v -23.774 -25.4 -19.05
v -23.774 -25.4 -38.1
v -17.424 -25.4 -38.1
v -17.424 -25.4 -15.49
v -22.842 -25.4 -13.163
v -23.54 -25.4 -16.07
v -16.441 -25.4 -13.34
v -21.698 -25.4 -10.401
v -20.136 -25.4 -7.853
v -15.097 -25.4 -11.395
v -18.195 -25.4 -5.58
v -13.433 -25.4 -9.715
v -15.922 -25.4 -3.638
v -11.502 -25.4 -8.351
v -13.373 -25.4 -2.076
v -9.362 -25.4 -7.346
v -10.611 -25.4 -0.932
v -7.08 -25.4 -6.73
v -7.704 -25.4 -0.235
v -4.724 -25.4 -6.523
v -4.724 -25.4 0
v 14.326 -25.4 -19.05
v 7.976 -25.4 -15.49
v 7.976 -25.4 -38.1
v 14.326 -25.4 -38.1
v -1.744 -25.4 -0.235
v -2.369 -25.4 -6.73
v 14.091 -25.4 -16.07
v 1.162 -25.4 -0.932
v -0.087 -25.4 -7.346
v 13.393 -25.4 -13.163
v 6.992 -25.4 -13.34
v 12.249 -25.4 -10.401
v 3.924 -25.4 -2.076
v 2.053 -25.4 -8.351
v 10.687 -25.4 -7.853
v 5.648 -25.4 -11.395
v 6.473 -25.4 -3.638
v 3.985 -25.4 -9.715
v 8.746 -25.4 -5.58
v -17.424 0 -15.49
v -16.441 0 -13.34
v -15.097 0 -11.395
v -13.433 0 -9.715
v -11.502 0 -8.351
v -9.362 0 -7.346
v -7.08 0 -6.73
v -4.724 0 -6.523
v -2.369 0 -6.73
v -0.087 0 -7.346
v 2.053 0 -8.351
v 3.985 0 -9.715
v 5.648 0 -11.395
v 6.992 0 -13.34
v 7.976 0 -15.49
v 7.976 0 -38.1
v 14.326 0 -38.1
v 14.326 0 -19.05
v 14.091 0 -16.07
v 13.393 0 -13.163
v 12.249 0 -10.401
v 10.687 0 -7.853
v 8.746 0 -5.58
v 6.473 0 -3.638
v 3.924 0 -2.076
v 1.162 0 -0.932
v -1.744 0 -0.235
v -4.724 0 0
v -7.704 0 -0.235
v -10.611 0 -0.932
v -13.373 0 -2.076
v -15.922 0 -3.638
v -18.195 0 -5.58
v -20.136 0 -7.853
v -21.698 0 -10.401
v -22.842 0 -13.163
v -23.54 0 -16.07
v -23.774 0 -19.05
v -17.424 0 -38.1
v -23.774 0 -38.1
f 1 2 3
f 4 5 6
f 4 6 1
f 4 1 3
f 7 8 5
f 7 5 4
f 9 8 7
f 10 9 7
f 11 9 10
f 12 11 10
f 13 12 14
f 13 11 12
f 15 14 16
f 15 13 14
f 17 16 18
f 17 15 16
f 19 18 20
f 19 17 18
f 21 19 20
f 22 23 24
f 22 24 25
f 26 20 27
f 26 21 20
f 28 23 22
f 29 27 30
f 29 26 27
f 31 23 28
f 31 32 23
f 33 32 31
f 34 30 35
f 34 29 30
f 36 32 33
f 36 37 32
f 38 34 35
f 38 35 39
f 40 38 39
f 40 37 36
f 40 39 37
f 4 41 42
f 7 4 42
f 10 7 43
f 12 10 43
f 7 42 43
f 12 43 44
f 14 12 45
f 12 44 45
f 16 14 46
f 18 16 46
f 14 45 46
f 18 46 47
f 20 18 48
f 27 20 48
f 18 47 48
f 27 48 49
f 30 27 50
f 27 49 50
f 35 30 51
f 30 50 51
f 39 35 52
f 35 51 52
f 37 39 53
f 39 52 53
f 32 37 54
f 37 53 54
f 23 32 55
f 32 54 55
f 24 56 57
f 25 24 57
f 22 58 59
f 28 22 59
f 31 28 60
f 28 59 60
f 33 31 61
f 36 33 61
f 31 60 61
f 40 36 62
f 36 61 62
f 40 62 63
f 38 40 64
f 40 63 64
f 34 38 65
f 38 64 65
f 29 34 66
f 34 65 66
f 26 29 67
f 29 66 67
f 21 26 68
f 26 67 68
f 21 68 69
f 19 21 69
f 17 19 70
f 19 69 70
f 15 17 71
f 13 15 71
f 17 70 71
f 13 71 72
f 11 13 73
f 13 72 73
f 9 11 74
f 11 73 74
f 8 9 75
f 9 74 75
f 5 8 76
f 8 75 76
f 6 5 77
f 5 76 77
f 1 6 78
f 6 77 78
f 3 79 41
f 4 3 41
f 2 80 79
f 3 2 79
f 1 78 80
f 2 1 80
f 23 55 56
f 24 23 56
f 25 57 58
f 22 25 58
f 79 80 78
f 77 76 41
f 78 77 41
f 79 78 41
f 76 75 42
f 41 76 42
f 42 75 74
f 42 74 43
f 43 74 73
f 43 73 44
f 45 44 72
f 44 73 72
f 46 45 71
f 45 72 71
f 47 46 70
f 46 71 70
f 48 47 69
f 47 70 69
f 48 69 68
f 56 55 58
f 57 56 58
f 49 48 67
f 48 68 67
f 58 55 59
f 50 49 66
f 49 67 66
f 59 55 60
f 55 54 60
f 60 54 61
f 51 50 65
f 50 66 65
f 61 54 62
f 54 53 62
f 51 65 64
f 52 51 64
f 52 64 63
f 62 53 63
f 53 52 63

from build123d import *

# Parameters (mm, degrees)
F1_DEPTH = 25.4
F2_DEPTH = 25.4
F3_DEPTH = 25.4


with BuildPart() as f1:
    # F0 (on Front) → F1 (new body)
    with BuildSketch(Plane.XZ):
        with BuildLine():
            ThreePointArc((-4.7244, 0), (-18.194785, -5.579616), (-23.7744, -19.05))
            Line((-23.7744, -19.05), (-23.7744, -38.1))
            Line((-23.7744, -38.1), (-17.4244, -38.1))
            Line((-17.4244, -38.1), (-17.4244, -24.509516))
            ThreePointArc((-17.4244, -24.509516), (-18.201369, -19.999674), (-17.4244, -15.489832))
            Line((-17.4244, -15.489832), (-17.4244, -6.35))
            Line((-17.4244, -6.35), (7.9756, -6.35))
            Line((7.9756, -6.35), (7.9756, -15.489832))
            ThreePointArc((7.9756, -15.489832), (8.752568, -19.999674), (7.9756, -24.509516))
            Line((7.9756, -24.509516), (7.9756, -38.1))
            Line((7.9756, -38.1), (14.3256, -38.1))
            Line((14.3256, -38.1), (14.3256, -19.05))
            ThreePointArc((14.3256, -19.05), (8.745984, -5.579616), (-4.7244, 0))
        make_face()
    extrude(amount=F1_DEPTH)

    # F0 (on Front) → F2 (join)
    with BuildSketch(Plane.XZ):
        with BuildLine():
            ThreePointArc((-4.7244, 0), (-18.194785, -5.579616), (-23.7744, -19.05))
            Line((-23.7744, -19.05), (-23.7744, -38.1))
            Line((-23.7744, -38.1), (-17.4244, -38.1))
            Line((-17.4244, -38.1), (-17.4244, -24.509516))
            ThreePointArc((-17.4244, -24.509516), (-18.201369, -19.999674), (-17.4244, -15.489832))
            Line((-17.4244, -15.489832), (-17.4244, -6.35))
            Line((-17.4244, -6.35), (7.9756, -6.35))
            Line((7.9756, -6.35), (7.9756, -15.489832))
            ThreePointArc((7.9756, -15.489832), (8.752568, -19.999674), (7.9756, -24.509516))
            Line((7.9756, -24.509516), (7.9756, -38.1))
            Line((7.9756, -38.1), (14.3256, -38.1))
            Line((14.3256, -38.1), (14.3256, -19.05))
            ThreePointArc((14.3256, -19.05), (8.745984, -5.579616), (-4.7244, 0))
        make_face()
        with BuildLine():
            ThreePointArc((-17.4244, -15.489832), (-18.201369, -19.999674), (-17.4244, -24.509516))
            Line((-17.4244, -24.509516), (-17.4244, -15.489832))
        make_face()
        with BuildLine():
            Line((-17.4244, -6.35), (-17.4244, -15.489832))
            ThreePointArc((-17.4244, -15.489832), (-4.7244, -6.522705), (7.9756, -15.489832))
            Line((7.9756, -15.489832), (7.9756, -6.35))
            Line((7.9756, -6.35), (-17.4244, -6.35))
        make_face()
        with BuildLine():
            ThreePointArc((7.9756, -24.509516), (8.752568, -19.999674), (7.9756, -15.489832))
            Line((7.9756, -15.489832), (7.9756, -24.509516))
        make_face()
    extrude(amount=F2_DEPTH)

    # F0 (on Front) → F3 (join)
    with BuildSketch(Plane.XZ):
        with BuildLine():
            ThreePointArc((-4.7244, 0), (-18.194785, -5.579616), (-23.7744, -19.05))
            Line((-23.7744, -19.05), (-23.7744, -38.1))
            Line((-23.7744, -38.1), (-17.4244, -38.1))
            Line((-17.4244, -38.1), (-17.4244, -24.509516))
            ThreePointArc((-17.4244, -24.509516), (-18.201369, -19.999674), (-17.4244, -15.489832))
            Line((-17.4244, -15.489832), (-17.4244, -6.35))
            Line((-17.4244, -6.35), (7.9756, -6.35))
            Line((7.9756, -6.35), (7.9756, -15.489832))
            ThreePointArc((7.9756, -15.489832), (8.752568, -19.999674), (7.9756, -24.509516))
            Line((7.9756, -24.509516), (7.9756, -38.1))
            Line((7.9756, -38.1), (14.3256, -38.1))
            Line((14.3256, -38.1), (14.3256, -19.05))
            ThreePointArc((14.3256, -19.05), (8.745984, -5.579616), (-4.7244, 0))
        make_face()
        with BuildLine():
            ThreePointArc((-17.4244, -15.489832), (-18.201369, -19.999674), (-17.4244, -24.509516))
            Line((-17.4244, -24.509516), (-17.4244, -15.489832))
        make_face()
        with BuildLine():
            Line((-17.4244, -6.35), (-17.4244, -15.489832))
            ThreePointArc((-17.4244, -15.489832), (-4.7244, -6.522705), (7.9756, -15.489832))
            Line((7.9756, -15.489832), (7.9756, -6.35))
            Line((7.9756, -6.35), (-17.4244, -6.35))
        make_face()
        with BuildLine():
            ThreePointArc((7.9756, -24.509516), (8.752568, -19.999674), (7.9756, -15.489832))
            Line((7.9756, -15.489832), (7.9756, -24.509516))
        make_face()
    extrude(amount=F3_DEPTH)


solid = f1.part
